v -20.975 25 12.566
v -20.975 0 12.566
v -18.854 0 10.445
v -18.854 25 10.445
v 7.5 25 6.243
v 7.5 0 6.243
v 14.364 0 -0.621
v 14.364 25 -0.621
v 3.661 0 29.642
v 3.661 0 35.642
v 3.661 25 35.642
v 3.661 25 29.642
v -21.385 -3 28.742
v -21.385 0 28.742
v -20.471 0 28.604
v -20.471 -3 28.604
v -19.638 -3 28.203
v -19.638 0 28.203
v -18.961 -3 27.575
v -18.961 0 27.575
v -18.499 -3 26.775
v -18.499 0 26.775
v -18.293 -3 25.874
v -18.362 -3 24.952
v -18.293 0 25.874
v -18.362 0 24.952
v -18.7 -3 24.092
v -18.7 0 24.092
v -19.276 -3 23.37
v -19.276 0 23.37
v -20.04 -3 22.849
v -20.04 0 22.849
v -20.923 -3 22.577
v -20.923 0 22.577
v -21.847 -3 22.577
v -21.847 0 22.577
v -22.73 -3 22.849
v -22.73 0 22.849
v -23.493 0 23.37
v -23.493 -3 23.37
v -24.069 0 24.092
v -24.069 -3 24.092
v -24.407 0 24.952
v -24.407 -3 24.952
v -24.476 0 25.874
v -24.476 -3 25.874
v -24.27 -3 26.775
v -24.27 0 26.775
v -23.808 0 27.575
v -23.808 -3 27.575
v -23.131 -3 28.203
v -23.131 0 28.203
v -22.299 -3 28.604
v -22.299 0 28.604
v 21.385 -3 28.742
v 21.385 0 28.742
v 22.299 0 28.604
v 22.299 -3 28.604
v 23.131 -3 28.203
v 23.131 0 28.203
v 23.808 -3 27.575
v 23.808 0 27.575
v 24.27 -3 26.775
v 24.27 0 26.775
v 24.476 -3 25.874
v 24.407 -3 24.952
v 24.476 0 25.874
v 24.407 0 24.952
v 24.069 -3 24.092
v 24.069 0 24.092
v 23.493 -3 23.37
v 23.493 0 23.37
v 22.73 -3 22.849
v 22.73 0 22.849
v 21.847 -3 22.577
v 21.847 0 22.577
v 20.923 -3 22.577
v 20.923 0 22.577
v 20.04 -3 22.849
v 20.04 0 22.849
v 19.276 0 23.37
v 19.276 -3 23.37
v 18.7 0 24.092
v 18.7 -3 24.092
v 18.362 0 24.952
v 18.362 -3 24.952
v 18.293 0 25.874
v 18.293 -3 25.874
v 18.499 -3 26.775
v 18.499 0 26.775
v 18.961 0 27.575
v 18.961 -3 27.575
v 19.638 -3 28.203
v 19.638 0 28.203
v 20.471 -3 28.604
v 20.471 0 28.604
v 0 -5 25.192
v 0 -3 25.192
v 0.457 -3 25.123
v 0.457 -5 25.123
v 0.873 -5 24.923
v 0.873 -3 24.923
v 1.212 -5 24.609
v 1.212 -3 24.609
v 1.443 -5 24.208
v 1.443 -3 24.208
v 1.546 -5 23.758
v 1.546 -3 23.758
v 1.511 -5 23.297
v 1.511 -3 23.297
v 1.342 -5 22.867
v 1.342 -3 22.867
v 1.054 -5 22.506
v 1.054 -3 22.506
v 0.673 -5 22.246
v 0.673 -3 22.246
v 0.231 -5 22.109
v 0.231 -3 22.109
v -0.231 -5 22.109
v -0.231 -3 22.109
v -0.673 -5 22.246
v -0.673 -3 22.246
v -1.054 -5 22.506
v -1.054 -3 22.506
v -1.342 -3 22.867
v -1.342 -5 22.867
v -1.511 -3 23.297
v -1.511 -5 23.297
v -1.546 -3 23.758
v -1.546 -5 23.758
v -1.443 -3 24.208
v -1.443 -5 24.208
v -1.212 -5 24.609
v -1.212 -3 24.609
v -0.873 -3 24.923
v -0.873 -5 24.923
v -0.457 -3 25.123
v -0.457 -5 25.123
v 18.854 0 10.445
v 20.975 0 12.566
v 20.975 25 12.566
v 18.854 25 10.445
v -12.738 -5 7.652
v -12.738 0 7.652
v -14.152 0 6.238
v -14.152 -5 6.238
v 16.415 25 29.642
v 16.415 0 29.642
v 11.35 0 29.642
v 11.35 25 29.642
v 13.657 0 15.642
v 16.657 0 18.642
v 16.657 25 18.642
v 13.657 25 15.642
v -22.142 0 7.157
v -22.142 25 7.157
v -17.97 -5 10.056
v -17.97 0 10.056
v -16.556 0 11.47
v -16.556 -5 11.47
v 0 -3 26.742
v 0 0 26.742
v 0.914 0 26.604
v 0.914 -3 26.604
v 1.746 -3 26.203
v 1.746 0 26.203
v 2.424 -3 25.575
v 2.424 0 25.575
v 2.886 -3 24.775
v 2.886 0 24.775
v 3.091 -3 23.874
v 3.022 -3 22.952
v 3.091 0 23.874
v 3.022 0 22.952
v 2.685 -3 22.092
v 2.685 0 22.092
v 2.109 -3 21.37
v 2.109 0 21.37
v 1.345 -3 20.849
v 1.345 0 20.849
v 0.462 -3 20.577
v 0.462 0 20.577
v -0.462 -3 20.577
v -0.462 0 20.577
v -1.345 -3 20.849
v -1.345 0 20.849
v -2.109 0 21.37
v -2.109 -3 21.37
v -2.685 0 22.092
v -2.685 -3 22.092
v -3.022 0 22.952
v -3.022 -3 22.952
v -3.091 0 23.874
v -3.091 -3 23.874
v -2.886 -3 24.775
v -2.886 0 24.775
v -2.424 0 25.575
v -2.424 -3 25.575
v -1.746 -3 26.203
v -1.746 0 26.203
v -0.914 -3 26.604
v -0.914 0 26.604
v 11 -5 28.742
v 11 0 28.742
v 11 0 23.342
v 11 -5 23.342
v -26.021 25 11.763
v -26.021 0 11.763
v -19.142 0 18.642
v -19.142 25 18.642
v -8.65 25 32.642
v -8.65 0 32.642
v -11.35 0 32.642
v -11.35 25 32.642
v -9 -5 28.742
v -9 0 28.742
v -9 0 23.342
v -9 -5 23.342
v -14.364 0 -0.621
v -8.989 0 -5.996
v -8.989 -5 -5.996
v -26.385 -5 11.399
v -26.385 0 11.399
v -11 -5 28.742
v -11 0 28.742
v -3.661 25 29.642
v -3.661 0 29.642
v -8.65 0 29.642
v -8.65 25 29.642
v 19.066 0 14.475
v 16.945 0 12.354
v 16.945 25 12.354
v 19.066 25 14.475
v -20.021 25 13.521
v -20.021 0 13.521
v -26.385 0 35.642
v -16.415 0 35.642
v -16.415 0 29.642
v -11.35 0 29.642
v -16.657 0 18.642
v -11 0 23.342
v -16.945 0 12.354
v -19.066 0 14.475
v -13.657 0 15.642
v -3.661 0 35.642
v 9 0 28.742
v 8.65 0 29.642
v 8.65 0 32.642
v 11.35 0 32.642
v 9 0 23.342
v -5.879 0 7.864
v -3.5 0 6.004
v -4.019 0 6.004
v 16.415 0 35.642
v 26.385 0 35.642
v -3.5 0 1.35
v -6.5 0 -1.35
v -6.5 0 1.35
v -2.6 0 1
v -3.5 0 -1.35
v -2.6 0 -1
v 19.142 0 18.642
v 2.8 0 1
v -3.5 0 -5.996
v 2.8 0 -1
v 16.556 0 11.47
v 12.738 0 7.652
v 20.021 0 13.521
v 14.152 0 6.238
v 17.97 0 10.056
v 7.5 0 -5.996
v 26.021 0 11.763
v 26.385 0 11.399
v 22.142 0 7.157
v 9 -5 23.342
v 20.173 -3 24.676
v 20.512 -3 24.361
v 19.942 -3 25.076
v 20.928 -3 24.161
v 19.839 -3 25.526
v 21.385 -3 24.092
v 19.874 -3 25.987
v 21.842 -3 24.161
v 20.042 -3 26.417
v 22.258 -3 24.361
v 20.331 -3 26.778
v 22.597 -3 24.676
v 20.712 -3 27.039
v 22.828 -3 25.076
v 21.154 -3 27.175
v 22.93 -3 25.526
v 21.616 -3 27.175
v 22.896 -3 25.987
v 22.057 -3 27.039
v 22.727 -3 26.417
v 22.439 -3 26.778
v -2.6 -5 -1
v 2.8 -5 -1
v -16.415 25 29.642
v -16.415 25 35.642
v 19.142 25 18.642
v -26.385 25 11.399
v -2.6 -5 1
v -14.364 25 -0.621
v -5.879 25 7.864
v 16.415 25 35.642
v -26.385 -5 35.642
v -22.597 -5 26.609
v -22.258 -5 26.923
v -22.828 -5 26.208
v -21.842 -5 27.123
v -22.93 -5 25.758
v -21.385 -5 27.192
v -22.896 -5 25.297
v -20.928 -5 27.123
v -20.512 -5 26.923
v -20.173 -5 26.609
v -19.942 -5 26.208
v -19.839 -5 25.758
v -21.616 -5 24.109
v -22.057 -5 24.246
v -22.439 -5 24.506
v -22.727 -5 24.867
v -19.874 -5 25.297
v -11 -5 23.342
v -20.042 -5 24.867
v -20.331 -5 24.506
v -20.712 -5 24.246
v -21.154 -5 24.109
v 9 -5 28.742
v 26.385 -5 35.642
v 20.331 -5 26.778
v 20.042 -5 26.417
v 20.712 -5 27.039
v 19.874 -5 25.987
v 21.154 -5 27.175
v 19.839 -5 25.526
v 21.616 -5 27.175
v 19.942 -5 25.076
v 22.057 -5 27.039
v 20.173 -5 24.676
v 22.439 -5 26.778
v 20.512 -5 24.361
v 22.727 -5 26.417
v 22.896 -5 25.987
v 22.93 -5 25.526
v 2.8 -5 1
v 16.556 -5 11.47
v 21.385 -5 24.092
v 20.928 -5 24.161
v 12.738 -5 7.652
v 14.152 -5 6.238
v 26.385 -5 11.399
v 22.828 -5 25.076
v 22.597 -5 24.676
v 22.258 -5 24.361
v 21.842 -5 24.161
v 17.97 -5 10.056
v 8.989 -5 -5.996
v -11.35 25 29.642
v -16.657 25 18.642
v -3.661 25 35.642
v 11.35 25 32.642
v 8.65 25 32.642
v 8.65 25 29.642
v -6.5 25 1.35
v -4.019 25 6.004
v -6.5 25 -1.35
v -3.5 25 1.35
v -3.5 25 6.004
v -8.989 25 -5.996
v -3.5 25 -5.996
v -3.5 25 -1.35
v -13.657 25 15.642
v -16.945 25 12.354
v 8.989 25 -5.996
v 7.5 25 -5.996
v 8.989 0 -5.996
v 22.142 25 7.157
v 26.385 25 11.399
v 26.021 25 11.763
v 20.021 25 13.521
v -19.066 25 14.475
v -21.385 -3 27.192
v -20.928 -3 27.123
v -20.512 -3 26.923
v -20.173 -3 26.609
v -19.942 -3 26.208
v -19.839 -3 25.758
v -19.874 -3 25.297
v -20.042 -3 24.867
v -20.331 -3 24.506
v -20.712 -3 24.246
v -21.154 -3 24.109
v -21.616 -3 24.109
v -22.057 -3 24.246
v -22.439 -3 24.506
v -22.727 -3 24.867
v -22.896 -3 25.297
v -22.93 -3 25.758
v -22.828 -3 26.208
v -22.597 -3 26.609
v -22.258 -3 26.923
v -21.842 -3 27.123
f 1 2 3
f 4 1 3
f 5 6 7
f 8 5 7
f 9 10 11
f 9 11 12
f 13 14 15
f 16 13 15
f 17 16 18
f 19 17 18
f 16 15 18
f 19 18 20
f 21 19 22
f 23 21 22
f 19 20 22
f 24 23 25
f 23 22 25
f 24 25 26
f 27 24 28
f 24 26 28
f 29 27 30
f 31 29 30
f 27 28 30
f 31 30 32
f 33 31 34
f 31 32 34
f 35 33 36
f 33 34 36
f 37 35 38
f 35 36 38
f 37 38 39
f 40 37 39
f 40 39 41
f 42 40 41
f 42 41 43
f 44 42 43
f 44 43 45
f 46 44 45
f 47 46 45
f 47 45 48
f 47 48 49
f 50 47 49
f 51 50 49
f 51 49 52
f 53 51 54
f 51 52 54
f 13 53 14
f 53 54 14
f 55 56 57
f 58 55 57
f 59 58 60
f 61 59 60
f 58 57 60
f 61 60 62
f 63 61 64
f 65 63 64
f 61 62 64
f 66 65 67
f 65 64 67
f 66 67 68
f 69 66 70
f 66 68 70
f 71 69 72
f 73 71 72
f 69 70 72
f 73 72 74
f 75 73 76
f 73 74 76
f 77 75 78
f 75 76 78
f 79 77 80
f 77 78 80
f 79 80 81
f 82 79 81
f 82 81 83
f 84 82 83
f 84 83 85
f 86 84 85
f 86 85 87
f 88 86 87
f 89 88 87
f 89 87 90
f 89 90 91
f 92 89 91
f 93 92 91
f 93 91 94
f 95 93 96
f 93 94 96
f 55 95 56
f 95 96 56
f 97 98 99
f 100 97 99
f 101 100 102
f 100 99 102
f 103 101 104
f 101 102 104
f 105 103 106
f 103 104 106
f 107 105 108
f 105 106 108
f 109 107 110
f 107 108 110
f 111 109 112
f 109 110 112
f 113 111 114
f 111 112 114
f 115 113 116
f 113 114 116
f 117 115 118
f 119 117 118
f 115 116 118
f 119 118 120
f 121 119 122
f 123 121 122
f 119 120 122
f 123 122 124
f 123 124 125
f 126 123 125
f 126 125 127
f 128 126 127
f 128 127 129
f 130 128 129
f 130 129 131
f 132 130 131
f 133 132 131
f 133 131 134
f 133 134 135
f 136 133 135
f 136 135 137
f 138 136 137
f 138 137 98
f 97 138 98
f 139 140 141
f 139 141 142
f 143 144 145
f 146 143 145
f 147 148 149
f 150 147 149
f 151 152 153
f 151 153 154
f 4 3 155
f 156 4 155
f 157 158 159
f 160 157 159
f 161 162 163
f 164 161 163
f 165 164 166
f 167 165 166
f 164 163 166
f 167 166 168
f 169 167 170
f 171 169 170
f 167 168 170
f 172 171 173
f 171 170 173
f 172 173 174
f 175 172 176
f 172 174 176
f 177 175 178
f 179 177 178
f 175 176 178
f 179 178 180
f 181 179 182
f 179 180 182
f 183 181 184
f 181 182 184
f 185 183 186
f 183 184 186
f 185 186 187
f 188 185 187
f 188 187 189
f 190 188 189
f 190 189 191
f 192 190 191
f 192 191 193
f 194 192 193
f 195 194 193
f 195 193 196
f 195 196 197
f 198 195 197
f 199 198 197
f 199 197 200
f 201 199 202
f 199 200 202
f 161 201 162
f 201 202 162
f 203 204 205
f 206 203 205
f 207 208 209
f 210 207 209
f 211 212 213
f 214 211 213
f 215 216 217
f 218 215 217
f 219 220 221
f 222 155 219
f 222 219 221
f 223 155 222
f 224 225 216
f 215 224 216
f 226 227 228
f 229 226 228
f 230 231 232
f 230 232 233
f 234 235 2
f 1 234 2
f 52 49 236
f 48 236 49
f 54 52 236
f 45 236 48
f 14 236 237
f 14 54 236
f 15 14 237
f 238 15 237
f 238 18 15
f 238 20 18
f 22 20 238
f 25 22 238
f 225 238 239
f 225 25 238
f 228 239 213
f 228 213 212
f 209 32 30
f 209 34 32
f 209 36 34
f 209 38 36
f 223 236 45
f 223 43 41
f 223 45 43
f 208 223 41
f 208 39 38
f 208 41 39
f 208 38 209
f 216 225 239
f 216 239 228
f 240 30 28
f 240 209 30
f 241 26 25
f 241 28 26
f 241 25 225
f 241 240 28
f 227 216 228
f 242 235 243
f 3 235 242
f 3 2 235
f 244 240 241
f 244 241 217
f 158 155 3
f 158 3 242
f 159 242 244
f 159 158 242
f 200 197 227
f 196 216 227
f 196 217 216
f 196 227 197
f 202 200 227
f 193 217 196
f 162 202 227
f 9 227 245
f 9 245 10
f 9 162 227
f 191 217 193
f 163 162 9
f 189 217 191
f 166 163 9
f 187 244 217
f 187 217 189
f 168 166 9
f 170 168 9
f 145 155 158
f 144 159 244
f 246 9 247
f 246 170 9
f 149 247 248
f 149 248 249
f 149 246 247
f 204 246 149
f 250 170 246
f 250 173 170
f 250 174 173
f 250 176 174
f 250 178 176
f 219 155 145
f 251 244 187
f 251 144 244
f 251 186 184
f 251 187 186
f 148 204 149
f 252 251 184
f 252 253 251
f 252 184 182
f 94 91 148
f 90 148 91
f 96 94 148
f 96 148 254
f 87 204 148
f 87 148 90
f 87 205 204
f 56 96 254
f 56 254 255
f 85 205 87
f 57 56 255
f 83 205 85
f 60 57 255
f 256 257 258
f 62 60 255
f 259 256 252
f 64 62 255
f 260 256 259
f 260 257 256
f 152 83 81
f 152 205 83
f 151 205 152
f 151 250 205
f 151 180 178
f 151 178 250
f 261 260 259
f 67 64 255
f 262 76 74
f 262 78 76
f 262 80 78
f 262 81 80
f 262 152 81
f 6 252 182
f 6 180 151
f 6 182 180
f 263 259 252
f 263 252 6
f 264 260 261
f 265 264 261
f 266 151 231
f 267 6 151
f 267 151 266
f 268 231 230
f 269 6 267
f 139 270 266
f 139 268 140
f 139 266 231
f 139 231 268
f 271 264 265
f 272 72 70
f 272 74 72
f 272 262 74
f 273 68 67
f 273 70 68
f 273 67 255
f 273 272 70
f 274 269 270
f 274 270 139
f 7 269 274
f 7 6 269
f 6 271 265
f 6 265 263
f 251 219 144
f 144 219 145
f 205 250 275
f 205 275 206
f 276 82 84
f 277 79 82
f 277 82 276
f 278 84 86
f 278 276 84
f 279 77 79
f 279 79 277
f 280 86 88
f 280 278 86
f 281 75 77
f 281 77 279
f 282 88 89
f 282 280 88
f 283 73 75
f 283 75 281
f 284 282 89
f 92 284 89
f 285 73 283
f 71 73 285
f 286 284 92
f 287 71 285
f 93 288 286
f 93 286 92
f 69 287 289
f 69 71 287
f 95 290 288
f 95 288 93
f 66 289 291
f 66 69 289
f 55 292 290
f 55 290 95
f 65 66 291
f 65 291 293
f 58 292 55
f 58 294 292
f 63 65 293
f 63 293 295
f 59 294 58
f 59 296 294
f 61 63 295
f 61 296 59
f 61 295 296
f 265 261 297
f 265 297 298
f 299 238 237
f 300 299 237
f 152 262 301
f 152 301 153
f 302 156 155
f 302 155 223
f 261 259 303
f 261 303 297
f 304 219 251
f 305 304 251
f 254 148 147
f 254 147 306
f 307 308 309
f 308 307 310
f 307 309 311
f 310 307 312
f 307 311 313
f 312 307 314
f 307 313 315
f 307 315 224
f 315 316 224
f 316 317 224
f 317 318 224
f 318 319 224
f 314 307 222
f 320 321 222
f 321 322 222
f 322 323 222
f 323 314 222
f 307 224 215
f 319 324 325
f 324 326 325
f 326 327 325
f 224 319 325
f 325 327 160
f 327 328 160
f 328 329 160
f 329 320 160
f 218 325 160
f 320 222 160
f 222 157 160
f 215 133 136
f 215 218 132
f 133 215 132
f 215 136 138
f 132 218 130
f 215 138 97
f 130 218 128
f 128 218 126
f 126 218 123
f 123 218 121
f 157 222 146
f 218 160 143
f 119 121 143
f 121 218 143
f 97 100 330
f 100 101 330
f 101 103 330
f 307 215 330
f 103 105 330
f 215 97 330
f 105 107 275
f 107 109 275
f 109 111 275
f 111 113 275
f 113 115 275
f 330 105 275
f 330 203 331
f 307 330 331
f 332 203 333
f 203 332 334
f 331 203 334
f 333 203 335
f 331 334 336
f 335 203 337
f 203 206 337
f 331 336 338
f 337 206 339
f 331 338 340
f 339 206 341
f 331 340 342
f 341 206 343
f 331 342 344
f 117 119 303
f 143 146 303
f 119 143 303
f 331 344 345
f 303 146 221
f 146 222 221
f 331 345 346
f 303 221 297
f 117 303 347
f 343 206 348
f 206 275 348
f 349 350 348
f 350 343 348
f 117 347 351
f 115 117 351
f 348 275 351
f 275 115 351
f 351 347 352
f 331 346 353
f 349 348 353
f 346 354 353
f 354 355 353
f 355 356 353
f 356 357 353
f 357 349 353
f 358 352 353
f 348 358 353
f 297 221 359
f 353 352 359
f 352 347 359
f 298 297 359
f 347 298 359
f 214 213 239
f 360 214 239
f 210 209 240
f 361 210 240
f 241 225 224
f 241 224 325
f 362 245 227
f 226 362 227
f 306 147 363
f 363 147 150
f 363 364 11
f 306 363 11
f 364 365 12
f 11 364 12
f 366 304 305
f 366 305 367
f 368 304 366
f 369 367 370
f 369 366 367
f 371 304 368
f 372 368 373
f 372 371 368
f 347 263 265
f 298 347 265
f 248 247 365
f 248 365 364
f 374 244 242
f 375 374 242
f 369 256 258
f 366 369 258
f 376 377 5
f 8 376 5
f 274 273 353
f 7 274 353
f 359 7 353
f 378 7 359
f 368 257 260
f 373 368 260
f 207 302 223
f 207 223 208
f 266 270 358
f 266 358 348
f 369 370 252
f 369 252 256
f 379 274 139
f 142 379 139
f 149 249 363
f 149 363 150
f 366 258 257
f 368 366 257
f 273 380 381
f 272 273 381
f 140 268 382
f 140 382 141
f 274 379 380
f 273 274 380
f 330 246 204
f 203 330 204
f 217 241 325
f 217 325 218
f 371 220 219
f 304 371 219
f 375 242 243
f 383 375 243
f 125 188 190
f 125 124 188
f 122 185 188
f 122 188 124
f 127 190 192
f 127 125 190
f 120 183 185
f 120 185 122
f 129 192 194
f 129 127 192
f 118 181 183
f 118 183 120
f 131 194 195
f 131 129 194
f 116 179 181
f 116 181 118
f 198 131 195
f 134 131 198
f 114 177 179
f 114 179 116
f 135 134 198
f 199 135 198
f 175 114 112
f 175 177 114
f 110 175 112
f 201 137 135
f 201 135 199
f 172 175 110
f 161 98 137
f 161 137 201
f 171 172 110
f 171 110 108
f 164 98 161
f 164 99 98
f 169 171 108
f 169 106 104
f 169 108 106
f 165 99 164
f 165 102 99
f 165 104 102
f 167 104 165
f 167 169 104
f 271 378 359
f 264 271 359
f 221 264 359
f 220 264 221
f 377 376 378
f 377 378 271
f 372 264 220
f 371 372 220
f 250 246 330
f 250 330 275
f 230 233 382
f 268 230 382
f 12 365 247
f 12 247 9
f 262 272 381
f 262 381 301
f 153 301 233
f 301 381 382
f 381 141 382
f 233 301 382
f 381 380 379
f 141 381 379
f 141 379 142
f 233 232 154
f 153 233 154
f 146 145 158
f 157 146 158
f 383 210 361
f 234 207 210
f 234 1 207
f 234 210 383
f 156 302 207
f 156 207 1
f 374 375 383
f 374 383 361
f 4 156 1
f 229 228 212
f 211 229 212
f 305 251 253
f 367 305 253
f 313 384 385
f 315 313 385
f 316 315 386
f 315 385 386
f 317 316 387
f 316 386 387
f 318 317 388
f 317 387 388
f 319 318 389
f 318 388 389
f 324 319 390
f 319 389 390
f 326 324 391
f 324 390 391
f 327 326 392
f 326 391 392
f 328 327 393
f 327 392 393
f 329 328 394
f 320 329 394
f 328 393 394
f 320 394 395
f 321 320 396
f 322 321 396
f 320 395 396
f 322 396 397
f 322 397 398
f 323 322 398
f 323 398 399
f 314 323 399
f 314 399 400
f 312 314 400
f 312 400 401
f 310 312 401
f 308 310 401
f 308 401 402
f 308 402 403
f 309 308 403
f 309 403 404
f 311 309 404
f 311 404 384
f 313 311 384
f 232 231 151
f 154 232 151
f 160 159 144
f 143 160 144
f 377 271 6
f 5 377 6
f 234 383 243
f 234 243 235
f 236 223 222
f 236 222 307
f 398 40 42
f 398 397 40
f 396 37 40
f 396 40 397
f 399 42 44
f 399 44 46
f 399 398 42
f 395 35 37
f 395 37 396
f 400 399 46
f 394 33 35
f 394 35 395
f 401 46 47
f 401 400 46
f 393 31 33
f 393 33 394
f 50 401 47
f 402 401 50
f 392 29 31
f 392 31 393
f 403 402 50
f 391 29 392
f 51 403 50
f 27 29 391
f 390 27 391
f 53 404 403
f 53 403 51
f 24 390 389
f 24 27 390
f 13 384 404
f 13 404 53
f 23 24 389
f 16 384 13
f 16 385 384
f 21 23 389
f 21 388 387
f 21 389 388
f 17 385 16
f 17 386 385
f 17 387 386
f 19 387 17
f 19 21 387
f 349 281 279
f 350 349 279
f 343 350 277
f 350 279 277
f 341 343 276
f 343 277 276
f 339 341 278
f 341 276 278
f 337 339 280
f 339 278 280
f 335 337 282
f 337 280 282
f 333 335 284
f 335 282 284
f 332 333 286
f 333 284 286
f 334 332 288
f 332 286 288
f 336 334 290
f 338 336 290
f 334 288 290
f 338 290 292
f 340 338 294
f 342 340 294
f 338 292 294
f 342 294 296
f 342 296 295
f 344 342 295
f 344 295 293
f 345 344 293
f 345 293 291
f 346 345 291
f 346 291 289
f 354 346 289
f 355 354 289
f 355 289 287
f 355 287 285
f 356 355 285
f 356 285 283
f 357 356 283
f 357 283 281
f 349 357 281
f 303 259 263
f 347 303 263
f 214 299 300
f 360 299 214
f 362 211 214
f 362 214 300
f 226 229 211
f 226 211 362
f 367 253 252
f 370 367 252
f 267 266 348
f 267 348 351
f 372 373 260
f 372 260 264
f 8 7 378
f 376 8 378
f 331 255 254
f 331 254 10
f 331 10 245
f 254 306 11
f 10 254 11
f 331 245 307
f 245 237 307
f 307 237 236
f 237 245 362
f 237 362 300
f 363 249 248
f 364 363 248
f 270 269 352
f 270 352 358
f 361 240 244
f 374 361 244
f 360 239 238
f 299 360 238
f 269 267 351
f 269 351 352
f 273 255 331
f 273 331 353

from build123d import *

# Parameters (mm, degrees)
BOSS_EXTRUDE1_DEPTH   = 25
BOSS_EXTRUDE1_2_DEPTH = 25
BOSS_EXTRUDE1_3_DEPTH = 25
BOSS_EXTRUDE1_4_DEPTH = 25
BOSS_EXTRUDE1_5_DEPTH = 25
BOSS_EXTRUDE1_6_DEPTH = 25
BOSS_EXTRUDE2_DEPTH   = 5
SKETCH3_R             = 1.55
SKETCH3_W             = 5.4
SKETCH3_H             = 2
SKETCH3_W_2           = 2
SKETCH3_H_2           = 5.4
CUT_EXTRUDE1_DEPTH    = 5
SKETCH4_R             = 3.1
CUT_EXTRUDE2_DEPTH    = 3


with BuildPart() as part:
    # Sketch1 → Boss-Extrude1 (new body)
    with BuildSketch(Plane(origin=(0, 0, 0), x_dir=(1, 0, 0), z_dir=(0, 1, 0))):
        Polygon((-26.02081528, -11.763455967), (-19.142135624, -18.642135624), (-16.656854249, -18.642135624), (-13.656854249, -15.642135624), (-15.778174593, -13.52081528), (-16.944900782, -12.354089091), (-19.066221126, -14.475409435), (-20.02081528, -13.52081528), (-20.975409435, -12.566221126), (-18.854089091, -10.444900782), (-20.02081528, -9.278174593), (-22.142135624, -7.156854249), (-26.384776311, -11.399494937), align=None)
    extrude(amount=BOSS_EXTRUDE1_DEPTH)



with BuildPart() as body_2:
    # Sketch1 → Boss-Extrude1 2 (new body)
    with BuildSketch(Plane(origin=(0, 0, 0), x_dir=(1, 0, 0), z_dir=(0, 1, 0))):
        Polygon((-3.5, 3), (-3.5, 5.996116817), (-8.989164557, 5.996116817), (-14.363961031, 0.621320344), (-5.878679656, -7.863961031), (-4.018601808, -6.003883183), (-3.5, -6.003883183), (-3.5, -3), (-3.5, -1.35), (-6.5, -1.35), (-6.5, 1.35), (-3.5, 1.35), align=None)
    extrude(amount=BOSS_EXTRUDE1_2_DEPTH)


with BuildPart() as body_3:
    # Sketch1 → Boss-Extrude1 3 (new body)
    with BuildSketch(Plane(origin=(0, 0, 0), x_dir=(1, 0, 0), z_dir=(0, 1, 0))):
        Polygon((-10, -32.642135624), (-11.35, -32.642135624), (-11.35, -29.642135624), (-13.414613988, -29.642135624), (-16.414613988, -29.642135624), (-16.414613988, -35.642135624), (-3.660835443, -35.642135624), (-3.660835443, -29.642135624), (-6.660835443, -29.642135624), (-8.65, -29.642135624), (-8.65, -32.642135624), align=None)
    extrude(amount=BOSS_EXTRUDE1_3_DEPTH)


with BuildPart() as body_4:
    # Sketch1 → Boss-Extrude1 4 (new body)
    with BuildSketch(Plane(origin=(0, 0, 0), x_dir=(1, 0, 0), z_dir=(0, 1, 0))):
        Polygon((7.5, 5.996116817), (7.5, -6.242640687), (14.363961031, 0.621320344), (8.989164557, 5.996116817), align=None)
    extrude(amount=BOSS_EXTRUDE1_4_DEPTH)


with BuildPart() as body_5:
    # Sketch1 → Boss-Extrude1 5 (new body)
    with BuildSketch(Plane(origin=(0, 0, 0), x_dir=(1, 0, 0), z_dir=(0, 1, 0))):
        Polygon((16.944900782, -12.354089091), (19.066221126, -14.475409435), (20.02081528, -13.52081528), (20.975409435, -12.566221126), (18.854089091, -10.444900782), (20.02081528, -9.278174593), (22.142135624, -7.156854249), (26.384776311, -11.399494937), (26.02081528, -11.763455967), (19.142135624, -18.642135624), (16.656854249, -18.642135624), (13.656854249, -15.642135624), (15.778174593, -13.52081528), align=None)
    extrude(amount=BOSS_EXTRUDE1_5_DEPTH)


with BuildPart() as body_6:
    # Sketch1 → Boss-Extrude1 6 (new body)
    with BuildSketch(Plane(origin=(0, 0, 0), x_dir=(1, 0, 0), z_dir=(0, 1, 0))):
        Polygon((8.65, -29.642135624), (8.65, -32.642135624), (10, -32.642135624), (11.35, -32.642135624), (11.35, -29.642135624), (13.414613988, -29.642135624), (16.414613988, -29.642135624), (16.414613988, -35.642135624), (3.660835443, -35.642135624), (3.660835443, -29.642135624), (6.660835443, -29.642135624), align=None)
    extrude(amount=BOSS_EXTRUDE1_6_DEPTH)


with BuildPart() as part_1:
    add(part.part)

    add(body_2.part)  # Boss-Extrude2 merges body 2

    add(body_3.part)  # Boss-Extrude2 merges body 3

    add(body_4.part)  # Boss-Extrude2 merges body 4

    add(body_5.part)  # Boss-Extrude2 merges body 5

    add(body_6.part)  # Boss-Extrude2 merges body 6
    # Sketch2 → Boss-Extrude2 (add)
    with BuildSketch(Plane(origin=(0, 0, 0), x_dir=(-1, 0, 0), z_dir=(0, -1, 0))):
        Polygon((-26.384776311, -11.399494937), (-8.989164557, 5.996116817), (8.989164557, 5.996116817), (26.384776311, -11.399494937), (26.384776311, -35.642135624), (-16.414613988, -35.642135624), (-26.384776311, -35.642135624), align=None)
    extrude(amount=BOSS_EXTRUDE2_DEPTH)

    # Sketch3 → Cut-Extrude1 (cut)
    with BuildSketch(Plane(origin=(0, 0, 0), x_dir=(1, 0, 0), z_dir=(0, 1, 0))):
        with Locations(Location((-21.384776311, -25.642135624, 0), (0, 0, 270))):
            Circle(SKETCH3_R)
        with Locations(Location((0, -23.642135624, 0), (0, 0, 270))):
            Circle(SKETCH3_R)
        with Locations(Location((21.384776311, -25.642135624, 0), (0, 0, 90))):
            Circle(SKETCH3_R)
        with Locations((0.1, 0)):
            Rectangle(SKETCH3_W, SKETCH3_H)
        Polygon((-17.970205615, -10.055992052), (-16.555992052, -11.470205615), (-12.737615434, -7.651828996), (-14.151828996, -6.237615434), align=None)
        with Locations((10, -26.042135624)):
            Rectangle(SKETCH3_W_2, SKETCH3_H_2)
        with Locations((-10, -26.042135624)):
            Rectangle(SKETCH3_W_2, SKETCH3_H_2)
        Polygon((12.737615434, -7.651828996), (14.151828996, -6.237615434), (17.970205615, -10.055992052), (16.555992052, -11.470205615), align=None)
    extrude(amount=-CUT_EXTRUDE1_DEPTH, mode=Mode.SUBTRACT)

    # Sketch4 → Cut-Extrude2 (cut)
    with BuildSketch(Plane(origin=(0, 0, 0), x_dir=(1, 0, 0), z_dir=(0, 1, 0))):
        with Locations(Location((-21.384776311, -25.642135624, 0), (0, 0, 270))):
            Circle(SKETCH4_R)
        with Locations(Location((0, -23.642135624, 0), (0, 0, 270))):
            Circle(SKETCH4_R)
        with Locations(Location((21.384776311, -25.642135624, 0), (0, 0, 270))):
            Circle(SKETCH4_R)
    extrude(amount=-CUT_EXTRUDE2_DEPTH, mode=Mode.SUBTRACT)


solid = part_1.part
